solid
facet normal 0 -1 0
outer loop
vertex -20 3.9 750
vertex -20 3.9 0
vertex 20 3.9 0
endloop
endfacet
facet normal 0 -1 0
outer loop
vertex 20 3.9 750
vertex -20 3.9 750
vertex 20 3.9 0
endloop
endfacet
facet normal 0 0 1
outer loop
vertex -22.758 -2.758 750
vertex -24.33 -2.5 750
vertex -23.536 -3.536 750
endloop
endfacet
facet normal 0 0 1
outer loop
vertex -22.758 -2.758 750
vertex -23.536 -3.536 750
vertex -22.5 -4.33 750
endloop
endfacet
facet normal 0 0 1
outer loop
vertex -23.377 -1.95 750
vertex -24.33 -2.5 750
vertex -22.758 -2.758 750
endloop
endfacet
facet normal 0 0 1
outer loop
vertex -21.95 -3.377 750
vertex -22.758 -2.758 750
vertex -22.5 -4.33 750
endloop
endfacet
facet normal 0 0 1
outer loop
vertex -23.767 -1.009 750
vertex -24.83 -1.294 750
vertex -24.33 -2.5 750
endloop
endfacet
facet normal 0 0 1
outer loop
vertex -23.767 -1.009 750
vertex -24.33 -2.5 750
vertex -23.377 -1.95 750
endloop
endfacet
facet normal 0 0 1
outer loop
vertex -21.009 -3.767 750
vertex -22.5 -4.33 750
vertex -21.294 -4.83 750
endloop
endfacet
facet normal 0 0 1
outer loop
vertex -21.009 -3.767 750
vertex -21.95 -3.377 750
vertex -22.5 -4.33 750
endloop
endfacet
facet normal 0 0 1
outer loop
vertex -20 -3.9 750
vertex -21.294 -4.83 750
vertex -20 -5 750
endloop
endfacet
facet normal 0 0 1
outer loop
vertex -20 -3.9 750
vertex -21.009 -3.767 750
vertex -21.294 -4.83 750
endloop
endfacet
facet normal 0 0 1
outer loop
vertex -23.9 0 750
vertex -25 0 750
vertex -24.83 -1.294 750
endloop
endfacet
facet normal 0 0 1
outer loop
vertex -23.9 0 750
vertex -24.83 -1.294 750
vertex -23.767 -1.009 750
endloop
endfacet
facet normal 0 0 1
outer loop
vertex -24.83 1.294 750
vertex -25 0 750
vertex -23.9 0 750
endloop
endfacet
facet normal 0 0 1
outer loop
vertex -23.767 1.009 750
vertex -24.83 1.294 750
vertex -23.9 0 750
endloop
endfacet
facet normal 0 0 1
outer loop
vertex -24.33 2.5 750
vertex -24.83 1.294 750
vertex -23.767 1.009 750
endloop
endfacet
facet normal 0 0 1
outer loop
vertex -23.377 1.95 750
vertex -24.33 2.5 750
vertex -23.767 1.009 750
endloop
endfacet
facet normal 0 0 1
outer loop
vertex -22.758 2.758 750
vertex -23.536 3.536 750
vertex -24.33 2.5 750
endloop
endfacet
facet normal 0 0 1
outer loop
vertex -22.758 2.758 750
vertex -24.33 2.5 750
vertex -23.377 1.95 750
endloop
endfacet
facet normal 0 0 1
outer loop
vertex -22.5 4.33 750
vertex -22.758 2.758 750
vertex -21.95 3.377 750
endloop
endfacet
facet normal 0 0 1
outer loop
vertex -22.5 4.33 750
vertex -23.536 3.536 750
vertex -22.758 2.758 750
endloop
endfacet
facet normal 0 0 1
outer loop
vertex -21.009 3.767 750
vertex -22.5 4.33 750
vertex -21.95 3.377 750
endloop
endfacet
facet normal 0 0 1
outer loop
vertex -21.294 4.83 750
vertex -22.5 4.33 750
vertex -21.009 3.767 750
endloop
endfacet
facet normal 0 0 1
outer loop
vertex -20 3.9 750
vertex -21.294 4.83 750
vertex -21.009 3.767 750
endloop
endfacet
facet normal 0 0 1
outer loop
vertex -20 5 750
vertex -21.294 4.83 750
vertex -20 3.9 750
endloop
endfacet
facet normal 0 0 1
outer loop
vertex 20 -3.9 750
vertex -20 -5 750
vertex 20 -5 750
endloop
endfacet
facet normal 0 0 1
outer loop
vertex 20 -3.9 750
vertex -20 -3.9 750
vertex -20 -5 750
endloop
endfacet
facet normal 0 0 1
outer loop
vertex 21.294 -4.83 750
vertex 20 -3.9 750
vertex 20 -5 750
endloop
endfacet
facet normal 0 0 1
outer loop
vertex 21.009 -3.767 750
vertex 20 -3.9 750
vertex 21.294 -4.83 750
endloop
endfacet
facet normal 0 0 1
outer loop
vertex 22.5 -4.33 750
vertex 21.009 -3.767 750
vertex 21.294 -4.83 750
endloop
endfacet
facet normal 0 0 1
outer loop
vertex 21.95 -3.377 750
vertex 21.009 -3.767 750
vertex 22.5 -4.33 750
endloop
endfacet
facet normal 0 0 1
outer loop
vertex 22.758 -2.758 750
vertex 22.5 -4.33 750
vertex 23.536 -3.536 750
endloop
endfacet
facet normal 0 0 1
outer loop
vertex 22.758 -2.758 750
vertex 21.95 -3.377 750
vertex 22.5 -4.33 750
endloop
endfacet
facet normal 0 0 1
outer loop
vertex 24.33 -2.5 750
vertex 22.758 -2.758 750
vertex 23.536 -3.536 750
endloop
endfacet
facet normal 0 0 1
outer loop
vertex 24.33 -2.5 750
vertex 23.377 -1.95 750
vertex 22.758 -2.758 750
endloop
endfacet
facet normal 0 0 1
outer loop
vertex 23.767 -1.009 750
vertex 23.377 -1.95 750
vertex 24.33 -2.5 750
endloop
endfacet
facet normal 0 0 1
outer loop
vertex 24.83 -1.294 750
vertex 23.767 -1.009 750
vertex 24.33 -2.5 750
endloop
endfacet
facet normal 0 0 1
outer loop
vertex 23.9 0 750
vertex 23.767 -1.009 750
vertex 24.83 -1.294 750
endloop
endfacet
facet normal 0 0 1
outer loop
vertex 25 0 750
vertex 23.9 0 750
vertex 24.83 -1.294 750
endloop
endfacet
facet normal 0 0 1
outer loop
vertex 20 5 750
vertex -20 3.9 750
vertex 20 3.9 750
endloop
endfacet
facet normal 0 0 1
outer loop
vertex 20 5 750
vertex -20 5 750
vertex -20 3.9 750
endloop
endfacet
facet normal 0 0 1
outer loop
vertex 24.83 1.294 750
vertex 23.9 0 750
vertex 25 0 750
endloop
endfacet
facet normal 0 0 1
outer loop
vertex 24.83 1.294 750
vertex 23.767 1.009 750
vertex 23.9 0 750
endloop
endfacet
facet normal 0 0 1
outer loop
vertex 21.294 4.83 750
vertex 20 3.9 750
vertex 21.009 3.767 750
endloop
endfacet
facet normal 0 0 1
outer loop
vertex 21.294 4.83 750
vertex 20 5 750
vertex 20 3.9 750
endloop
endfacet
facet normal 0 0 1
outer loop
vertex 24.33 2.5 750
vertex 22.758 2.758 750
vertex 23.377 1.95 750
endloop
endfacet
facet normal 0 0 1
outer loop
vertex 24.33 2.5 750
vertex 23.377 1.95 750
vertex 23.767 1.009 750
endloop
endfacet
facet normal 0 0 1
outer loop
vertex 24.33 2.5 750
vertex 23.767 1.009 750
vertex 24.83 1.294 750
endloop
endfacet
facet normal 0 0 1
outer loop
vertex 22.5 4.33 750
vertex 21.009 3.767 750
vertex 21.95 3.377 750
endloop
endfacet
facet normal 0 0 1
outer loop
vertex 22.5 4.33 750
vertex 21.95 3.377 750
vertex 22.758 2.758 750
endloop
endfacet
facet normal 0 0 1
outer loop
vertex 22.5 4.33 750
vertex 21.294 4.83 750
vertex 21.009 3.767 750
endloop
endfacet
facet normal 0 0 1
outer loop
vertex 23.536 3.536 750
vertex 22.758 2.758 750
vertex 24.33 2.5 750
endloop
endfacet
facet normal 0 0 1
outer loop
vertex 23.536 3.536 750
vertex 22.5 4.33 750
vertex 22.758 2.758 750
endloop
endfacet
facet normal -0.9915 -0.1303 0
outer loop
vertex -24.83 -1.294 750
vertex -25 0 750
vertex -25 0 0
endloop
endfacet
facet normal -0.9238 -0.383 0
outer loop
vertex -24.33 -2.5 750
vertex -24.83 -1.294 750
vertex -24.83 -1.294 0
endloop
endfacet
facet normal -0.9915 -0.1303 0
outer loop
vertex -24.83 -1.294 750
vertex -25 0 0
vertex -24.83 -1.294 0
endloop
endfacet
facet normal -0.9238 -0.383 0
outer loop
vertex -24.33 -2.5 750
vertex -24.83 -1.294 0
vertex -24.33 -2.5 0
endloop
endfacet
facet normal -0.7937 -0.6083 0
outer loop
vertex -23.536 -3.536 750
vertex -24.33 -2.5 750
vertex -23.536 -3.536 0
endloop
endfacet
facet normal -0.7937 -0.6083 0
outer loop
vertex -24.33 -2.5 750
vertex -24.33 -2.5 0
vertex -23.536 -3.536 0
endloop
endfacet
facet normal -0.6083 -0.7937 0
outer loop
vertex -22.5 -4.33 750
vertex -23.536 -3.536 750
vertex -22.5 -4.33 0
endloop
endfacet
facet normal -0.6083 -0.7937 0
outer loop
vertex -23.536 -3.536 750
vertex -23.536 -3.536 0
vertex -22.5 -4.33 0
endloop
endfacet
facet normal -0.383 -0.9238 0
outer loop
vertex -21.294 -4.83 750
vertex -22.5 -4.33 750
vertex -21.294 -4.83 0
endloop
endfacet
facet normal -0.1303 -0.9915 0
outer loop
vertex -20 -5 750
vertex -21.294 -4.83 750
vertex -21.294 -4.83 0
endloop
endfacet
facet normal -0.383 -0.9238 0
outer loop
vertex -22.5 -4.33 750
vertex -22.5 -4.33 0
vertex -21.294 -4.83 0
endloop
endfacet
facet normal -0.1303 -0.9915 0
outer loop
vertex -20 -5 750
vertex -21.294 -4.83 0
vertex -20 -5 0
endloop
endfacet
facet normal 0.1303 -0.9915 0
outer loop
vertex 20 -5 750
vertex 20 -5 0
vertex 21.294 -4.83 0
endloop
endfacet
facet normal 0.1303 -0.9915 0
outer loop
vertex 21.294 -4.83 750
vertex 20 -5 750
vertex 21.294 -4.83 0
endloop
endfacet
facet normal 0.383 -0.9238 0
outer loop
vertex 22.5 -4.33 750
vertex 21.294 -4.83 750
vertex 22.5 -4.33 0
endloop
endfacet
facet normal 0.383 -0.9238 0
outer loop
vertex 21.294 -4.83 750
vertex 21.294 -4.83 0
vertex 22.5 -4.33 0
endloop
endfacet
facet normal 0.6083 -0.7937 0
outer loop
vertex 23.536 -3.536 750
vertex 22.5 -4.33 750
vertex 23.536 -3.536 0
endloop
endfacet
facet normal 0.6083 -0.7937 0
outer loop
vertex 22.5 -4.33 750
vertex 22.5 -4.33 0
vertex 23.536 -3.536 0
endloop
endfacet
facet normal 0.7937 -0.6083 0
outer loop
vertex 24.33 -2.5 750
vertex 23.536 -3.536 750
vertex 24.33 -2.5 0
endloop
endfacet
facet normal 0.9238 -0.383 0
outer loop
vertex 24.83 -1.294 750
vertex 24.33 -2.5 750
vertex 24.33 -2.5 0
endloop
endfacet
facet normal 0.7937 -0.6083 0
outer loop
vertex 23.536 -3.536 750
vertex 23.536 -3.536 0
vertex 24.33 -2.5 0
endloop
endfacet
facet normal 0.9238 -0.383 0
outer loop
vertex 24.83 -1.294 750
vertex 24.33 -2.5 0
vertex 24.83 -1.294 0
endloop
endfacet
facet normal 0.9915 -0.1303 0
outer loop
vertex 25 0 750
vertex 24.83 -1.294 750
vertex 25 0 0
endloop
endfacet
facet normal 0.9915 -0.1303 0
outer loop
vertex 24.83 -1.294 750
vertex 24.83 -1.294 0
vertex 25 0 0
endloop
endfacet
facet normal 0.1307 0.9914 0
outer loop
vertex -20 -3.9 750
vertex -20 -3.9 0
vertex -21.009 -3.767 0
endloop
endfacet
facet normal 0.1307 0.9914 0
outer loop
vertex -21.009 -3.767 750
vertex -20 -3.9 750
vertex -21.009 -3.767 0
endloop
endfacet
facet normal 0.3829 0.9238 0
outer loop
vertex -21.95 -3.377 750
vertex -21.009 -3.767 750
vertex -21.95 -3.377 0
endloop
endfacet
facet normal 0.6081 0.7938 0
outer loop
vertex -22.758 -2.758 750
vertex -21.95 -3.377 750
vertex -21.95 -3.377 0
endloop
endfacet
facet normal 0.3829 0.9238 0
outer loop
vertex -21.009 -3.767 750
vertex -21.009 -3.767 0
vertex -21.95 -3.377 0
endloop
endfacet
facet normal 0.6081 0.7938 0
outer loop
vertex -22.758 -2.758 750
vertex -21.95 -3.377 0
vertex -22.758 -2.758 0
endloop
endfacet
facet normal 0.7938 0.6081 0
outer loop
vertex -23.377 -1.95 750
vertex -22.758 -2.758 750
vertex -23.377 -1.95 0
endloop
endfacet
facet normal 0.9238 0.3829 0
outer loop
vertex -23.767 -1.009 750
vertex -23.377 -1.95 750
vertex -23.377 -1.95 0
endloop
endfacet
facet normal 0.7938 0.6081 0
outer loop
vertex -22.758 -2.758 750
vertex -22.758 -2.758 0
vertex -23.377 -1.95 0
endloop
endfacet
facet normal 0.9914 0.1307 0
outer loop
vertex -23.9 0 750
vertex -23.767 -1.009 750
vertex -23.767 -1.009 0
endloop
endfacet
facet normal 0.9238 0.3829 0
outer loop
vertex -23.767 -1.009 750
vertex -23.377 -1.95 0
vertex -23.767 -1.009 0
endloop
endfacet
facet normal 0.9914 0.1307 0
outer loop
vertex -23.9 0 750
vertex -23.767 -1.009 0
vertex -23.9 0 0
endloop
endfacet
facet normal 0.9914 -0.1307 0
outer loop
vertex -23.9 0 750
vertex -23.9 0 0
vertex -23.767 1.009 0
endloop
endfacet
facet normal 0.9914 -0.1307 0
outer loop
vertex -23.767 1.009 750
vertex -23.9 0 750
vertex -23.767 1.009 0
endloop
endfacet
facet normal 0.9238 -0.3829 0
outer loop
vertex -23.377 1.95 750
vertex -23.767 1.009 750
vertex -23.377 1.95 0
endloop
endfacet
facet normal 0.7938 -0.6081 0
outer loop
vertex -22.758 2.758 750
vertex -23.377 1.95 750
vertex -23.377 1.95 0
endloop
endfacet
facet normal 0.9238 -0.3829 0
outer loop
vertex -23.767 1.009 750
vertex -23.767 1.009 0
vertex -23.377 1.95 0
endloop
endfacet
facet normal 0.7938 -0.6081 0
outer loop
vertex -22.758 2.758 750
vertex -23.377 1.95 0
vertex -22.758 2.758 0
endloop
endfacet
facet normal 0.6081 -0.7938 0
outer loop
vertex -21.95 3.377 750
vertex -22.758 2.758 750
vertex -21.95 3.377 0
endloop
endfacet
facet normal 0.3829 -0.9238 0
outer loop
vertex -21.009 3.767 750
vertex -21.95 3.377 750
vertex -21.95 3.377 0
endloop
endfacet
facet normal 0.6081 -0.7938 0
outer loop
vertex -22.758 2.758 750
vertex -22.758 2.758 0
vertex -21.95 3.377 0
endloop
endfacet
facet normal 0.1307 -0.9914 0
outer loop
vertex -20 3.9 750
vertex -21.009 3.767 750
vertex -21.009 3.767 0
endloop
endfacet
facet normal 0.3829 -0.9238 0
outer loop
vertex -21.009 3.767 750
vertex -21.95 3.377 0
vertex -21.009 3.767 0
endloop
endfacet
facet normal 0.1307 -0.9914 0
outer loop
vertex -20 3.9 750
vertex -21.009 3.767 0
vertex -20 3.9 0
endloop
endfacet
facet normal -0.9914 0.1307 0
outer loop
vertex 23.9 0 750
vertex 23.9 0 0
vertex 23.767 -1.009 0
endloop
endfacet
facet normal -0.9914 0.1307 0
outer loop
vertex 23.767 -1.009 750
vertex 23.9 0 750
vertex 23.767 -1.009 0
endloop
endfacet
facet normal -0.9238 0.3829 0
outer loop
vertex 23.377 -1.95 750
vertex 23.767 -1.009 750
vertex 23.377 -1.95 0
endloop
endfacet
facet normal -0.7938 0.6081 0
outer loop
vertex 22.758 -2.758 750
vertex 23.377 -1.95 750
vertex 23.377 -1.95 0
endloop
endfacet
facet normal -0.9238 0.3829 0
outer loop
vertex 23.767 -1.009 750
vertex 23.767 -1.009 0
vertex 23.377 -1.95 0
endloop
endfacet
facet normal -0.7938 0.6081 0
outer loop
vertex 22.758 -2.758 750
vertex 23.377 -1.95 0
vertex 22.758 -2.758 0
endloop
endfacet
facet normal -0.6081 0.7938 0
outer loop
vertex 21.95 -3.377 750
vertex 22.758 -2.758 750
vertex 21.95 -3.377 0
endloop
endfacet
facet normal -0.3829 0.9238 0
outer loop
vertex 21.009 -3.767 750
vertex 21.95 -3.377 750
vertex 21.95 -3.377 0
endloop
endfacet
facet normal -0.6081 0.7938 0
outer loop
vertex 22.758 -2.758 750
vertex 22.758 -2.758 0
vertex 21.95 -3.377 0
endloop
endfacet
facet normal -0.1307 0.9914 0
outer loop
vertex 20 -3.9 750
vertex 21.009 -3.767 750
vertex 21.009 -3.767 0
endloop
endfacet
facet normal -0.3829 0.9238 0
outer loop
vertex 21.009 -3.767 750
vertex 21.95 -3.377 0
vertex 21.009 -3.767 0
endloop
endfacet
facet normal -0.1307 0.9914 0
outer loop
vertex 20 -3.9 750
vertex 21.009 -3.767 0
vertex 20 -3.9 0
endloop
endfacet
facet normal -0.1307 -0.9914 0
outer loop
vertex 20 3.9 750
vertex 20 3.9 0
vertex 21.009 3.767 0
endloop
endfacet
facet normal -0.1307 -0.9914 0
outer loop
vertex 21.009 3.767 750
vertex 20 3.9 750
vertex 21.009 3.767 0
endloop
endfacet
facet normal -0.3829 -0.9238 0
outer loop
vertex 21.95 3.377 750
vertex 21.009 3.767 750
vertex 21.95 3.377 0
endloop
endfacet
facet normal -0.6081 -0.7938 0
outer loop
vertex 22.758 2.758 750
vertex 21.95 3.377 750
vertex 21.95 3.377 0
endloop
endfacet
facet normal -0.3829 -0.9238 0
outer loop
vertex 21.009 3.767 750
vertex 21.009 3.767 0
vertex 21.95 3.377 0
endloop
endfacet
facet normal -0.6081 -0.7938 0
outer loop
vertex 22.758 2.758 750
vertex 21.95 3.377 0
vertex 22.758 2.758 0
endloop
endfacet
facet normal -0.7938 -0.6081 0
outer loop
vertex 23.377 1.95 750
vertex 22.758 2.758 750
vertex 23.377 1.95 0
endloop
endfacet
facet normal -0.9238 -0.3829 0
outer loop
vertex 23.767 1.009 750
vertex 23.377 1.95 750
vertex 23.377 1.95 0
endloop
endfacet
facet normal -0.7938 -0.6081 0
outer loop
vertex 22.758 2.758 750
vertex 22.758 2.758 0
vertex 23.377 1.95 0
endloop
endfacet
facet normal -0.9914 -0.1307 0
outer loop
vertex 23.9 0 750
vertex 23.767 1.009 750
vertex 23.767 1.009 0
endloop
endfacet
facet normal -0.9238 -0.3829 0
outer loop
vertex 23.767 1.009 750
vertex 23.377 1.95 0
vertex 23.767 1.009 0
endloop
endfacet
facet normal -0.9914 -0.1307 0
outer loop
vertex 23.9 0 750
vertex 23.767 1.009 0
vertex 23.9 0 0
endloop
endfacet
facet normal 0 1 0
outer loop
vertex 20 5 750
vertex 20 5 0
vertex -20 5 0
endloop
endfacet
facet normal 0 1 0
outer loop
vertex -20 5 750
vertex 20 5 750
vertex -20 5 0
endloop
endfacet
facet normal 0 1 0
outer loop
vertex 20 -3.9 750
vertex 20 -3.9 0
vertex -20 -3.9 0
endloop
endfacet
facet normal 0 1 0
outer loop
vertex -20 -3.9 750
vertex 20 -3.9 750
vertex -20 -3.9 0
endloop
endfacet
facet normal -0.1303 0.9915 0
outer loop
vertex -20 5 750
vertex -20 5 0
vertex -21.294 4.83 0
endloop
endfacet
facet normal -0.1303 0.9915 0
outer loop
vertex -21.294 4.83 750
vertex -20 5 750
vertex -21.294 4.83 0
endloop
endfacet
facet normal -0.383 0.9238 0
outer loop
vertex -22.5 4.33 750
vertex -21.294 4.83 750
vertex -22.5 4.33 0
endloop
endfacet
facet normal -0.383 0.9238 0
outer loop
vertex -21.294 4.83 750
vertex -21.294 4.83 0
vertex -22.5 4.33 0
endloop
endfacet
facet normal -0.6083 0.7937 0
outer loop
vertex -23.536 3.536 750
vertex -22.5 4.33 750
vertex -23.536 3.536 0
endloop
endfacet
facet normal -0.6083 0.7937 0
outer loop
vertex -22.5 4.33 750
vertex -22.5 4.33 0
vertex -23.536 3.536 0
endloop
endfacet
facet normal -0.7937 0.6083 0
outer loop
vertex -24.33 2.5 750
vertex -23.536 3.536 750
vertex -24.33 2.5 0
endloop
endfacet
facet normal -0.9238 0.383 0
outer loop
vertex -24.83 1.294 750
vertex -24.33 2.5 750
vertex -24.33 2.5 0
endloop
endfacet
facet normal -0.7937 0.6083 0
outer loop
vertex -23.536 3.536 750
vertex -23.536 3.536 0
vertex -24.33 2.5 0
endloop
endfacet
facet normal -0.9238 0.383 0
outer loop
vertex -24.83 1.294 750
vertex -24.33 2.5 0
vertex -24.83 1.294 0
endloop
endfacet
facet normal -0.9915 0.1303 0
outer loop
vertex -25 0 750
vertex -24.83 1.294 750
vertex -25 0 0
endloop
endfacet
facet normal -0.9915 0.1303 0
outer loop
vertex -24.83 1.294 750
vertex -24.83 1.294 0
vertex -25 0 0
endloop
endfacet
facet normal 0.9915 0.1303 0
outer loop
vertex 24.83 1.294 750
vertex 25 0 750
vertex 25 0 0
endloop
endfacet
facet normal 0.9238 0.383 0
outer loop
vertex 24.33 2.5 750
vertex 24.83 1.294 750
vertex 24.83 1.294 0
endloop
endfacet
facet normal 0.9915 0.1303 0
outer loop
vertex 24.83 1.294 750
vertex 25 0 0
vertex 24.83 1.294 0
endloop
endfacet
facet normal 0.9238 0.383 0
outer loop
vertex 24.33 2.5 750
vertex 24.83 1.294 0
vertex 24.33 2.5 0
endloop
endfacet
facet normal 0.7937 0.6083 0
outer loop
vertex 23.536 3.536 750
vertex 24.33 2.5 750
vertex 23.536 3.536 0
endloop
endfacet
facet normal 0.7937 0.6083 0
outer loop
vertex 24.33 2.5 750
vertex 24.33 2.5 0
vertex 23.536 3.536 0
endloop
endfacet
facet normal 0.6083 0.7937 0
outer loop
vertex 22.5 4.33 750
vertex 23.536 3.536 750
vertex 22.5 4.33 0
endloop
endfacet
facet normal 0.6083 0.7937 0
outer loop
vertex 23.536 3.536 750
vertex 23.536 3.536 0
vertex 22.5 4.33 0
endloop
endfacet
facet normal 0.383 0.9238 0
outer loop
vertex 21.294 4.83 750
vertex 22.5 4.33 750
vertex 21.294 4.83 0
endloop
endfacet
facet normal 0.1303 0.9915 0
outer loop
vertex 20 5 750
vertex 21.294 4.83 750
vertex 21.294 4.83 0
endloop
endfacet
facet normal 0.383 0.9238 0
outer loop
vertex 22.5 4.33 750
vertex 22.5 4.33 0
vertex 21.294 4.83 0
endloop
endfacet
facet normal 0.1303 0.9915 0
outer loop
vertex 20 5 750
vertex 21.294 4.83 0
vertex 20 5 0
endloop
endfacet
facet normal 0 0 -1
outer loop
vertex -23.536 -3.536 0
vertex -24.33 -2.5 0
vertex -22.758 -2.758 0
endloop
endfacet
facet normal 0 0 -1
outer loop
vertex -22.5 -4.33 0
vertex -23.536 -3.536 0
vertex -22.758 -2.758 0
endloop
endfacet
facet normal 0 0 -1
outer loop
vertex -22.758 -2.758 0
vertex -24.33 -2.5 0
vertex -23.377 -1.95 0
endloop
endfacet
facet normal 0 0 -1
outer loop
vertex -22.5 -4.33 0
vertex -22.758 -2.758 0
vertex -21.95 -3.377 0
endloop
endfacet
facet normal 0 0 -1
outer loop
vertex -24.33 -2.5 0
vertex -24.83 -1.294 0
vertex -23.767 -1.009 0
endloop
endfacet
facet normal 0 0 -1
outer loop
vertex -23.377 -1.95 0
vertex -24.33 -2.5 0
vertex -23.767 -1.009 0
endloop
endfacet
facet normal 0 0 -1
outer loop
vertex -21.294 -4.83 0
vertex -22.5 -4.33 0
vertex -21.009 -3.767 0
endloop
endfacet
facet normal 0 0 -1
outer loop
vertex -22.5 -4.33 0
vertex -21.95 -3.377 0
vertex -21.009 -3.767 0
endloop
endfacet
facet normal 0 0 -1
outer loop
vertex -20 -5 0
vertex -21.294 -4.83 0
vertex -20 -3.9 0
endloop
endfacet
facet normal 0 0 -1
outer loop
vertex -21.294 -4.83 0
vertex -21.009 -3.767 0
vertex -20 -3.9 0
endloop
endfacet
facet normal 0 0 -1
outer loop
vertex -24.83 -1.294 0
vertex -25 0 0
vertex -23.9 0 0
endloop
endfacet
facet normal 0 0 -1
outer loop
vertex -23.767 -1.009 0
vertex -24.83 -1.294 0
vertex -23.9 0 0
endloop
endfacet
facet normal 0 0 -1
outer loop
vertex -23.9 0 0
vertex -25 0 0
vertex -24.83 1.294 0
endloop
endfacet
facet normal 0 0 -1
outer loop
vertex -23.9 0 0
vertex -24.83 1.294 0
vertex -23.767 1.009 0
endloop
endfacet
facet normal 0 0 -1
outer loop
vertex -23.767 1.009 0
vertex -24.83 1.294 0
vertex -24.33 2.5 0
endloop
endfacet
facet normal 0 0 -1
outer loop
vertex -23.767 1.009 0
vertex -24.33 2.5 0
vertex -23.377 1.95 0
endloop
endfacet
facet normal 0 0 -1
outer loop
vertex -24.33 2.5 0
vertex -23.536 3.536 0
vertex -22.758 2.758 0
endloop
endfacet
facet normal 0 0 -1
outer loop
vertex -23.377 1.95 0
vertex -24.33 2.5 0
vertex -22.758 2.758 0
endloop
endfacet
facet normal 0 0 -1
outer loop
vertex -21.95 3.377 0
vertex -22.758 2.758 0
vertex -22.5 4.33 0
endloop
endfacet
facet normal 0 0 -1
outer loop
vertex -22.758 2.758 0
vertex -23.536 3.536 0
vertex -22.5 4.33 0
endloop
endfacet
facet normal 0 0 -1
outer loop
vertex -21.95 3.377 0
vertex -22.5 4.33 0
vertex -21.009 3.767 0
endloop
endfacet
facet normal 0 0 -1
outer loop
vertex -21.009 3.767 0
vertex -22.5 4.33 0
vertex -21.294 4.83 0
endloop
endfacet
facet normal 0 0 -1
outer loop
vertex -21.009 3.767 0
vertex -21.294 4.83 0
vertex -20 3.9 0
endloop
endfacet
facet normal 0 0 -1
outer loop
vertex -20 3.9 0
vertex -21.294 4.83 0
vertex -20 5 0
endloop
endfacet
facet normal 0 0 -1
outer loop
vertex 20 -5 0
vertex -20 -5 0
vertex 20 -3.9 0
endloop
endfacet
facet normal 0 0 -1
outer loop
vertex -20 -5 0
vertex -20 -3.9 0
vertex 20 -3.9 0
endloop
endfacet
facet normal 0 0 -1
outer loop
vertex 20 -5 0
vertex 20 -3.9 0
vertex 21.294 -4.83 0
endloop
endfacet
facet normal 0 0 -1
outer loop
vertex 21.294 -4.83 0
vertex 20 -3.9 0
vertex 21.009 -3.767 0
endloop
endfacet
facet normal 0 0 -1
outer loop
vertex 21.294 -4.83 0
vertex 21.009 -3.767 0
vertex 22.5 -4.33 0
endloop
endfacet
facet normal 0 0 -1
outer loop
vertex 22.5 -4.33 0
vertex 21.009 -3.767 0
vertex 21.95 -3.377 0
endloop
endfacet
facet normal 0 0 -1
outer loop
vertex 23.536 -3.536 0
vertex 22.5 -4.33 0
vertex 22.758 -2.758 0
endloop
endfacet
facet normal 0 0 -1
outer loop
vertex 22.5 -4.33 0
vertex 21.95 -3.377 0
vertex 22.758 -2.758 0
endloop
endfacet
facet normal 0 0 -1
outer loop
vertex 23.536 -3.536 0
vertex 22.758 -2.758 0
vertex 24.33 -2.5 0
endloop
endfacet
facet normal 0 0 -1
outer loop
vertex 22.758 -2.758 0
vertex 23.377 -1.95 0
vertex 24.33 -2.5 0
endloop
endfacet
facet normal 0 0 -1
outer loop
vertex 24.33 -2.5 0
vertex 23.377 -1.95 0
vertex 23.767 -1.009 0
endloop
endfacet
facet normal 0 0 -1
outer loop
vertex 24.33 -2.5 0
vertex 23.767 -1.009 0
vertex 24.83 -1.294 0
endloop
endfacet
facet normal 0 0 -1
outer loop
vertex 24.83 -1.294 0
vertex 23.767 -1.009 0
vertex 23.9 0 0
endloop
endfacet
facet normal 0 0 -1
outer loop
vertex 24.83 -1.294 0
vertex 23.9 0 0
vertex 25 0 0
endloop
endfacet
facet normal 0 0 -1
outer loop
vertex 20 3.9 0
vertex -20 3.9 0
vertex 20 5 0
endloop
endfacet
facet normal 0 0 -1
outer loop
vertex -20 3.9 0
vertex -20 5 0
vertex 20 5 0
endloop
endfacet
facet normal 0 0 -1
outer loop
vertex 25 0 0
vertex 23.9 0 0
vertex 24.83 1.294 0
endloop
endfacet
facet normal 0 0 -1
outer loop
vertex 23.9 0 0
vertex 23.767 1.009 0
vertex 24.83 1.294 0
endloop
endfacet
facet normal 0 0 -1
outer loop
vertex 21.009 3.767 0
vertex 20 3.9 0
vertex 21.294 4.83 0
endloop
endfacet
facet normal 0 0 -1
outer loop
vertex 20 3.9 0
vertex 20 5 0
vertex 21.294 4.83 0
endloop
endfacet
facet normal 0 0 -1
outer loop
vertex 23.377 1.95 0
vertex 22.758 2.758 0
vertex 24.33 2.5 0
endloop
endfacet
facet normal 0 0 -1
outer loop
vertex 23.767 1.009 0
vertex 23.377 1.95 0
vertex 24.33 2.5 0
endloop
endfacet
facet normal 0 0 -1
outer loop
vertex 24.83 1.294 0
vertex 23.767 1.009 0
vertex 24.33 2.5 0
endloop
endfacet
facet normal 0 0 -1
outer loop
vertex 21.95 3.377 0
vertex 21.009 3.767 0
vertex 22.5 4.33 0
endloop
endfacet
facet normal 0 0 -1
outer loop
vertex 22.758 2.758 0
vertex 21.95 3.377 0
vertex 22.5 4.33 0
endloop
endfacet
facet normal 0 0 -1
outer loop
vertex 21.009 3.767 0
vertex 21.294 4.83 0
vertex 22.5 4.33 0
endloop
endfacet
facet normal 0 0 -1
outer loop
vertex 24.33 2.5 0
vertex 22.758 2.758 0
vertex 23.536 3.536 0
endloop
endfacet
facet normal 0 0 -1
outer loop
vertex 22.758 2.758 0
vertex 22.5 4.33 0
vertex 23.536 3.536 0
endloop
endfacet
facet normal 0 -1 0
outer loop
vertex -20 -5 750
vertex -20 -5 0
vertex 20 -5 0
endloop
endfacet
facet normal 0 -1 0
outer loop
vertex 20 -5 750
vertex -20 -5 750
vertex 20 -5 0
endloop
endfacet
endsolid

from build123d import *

# Parameters (mm, degrees)
F1_DEPTH = 750


with BuildPart() as f1:
    # F0 (on Top) → F1 (new body)
    with BuildSketch(Plane.XY):
        with BuildLine():
            Line((20, 5), (-20, 5))
            ThreePointArc((-20, 5), (-23.535534, 3.535534), (-25, 0))
            ThreePointArc((-25, 0), (-23.535534, -3.535534), (-20, -5))
            Line((-20, -5), (20, -5))
            ThreePointArc((20, -5), (23.535534, -3.535534), (25, 0))
            ThreePointArc((25, 0), (23.535534, 3.535534), (20, 5))
        make_face()
        with BuildLine():
            ThreePointArc((-23.9, 0), (-22.757716, 2.757716), (-20, 3.9))
            Line((-20, 3.9), (20, 3.9))
            ThreePointArc((20, 3.9), (22.757716, 2.757716), (23.9, 0))
            ThreePointArc((23.9, 0), (22.757716, -2.757716), (20, -3.9))
            Line((20, -3.9), (-20, -3.9))
            ThreePointArc((-20, -3.9), (-22.757716, -2.757716), (-23.9, 0))
        make_face(mode=Mode.SUBTRACT)
    extrude(amount=F1_DEPTH)


solid = f1.part
